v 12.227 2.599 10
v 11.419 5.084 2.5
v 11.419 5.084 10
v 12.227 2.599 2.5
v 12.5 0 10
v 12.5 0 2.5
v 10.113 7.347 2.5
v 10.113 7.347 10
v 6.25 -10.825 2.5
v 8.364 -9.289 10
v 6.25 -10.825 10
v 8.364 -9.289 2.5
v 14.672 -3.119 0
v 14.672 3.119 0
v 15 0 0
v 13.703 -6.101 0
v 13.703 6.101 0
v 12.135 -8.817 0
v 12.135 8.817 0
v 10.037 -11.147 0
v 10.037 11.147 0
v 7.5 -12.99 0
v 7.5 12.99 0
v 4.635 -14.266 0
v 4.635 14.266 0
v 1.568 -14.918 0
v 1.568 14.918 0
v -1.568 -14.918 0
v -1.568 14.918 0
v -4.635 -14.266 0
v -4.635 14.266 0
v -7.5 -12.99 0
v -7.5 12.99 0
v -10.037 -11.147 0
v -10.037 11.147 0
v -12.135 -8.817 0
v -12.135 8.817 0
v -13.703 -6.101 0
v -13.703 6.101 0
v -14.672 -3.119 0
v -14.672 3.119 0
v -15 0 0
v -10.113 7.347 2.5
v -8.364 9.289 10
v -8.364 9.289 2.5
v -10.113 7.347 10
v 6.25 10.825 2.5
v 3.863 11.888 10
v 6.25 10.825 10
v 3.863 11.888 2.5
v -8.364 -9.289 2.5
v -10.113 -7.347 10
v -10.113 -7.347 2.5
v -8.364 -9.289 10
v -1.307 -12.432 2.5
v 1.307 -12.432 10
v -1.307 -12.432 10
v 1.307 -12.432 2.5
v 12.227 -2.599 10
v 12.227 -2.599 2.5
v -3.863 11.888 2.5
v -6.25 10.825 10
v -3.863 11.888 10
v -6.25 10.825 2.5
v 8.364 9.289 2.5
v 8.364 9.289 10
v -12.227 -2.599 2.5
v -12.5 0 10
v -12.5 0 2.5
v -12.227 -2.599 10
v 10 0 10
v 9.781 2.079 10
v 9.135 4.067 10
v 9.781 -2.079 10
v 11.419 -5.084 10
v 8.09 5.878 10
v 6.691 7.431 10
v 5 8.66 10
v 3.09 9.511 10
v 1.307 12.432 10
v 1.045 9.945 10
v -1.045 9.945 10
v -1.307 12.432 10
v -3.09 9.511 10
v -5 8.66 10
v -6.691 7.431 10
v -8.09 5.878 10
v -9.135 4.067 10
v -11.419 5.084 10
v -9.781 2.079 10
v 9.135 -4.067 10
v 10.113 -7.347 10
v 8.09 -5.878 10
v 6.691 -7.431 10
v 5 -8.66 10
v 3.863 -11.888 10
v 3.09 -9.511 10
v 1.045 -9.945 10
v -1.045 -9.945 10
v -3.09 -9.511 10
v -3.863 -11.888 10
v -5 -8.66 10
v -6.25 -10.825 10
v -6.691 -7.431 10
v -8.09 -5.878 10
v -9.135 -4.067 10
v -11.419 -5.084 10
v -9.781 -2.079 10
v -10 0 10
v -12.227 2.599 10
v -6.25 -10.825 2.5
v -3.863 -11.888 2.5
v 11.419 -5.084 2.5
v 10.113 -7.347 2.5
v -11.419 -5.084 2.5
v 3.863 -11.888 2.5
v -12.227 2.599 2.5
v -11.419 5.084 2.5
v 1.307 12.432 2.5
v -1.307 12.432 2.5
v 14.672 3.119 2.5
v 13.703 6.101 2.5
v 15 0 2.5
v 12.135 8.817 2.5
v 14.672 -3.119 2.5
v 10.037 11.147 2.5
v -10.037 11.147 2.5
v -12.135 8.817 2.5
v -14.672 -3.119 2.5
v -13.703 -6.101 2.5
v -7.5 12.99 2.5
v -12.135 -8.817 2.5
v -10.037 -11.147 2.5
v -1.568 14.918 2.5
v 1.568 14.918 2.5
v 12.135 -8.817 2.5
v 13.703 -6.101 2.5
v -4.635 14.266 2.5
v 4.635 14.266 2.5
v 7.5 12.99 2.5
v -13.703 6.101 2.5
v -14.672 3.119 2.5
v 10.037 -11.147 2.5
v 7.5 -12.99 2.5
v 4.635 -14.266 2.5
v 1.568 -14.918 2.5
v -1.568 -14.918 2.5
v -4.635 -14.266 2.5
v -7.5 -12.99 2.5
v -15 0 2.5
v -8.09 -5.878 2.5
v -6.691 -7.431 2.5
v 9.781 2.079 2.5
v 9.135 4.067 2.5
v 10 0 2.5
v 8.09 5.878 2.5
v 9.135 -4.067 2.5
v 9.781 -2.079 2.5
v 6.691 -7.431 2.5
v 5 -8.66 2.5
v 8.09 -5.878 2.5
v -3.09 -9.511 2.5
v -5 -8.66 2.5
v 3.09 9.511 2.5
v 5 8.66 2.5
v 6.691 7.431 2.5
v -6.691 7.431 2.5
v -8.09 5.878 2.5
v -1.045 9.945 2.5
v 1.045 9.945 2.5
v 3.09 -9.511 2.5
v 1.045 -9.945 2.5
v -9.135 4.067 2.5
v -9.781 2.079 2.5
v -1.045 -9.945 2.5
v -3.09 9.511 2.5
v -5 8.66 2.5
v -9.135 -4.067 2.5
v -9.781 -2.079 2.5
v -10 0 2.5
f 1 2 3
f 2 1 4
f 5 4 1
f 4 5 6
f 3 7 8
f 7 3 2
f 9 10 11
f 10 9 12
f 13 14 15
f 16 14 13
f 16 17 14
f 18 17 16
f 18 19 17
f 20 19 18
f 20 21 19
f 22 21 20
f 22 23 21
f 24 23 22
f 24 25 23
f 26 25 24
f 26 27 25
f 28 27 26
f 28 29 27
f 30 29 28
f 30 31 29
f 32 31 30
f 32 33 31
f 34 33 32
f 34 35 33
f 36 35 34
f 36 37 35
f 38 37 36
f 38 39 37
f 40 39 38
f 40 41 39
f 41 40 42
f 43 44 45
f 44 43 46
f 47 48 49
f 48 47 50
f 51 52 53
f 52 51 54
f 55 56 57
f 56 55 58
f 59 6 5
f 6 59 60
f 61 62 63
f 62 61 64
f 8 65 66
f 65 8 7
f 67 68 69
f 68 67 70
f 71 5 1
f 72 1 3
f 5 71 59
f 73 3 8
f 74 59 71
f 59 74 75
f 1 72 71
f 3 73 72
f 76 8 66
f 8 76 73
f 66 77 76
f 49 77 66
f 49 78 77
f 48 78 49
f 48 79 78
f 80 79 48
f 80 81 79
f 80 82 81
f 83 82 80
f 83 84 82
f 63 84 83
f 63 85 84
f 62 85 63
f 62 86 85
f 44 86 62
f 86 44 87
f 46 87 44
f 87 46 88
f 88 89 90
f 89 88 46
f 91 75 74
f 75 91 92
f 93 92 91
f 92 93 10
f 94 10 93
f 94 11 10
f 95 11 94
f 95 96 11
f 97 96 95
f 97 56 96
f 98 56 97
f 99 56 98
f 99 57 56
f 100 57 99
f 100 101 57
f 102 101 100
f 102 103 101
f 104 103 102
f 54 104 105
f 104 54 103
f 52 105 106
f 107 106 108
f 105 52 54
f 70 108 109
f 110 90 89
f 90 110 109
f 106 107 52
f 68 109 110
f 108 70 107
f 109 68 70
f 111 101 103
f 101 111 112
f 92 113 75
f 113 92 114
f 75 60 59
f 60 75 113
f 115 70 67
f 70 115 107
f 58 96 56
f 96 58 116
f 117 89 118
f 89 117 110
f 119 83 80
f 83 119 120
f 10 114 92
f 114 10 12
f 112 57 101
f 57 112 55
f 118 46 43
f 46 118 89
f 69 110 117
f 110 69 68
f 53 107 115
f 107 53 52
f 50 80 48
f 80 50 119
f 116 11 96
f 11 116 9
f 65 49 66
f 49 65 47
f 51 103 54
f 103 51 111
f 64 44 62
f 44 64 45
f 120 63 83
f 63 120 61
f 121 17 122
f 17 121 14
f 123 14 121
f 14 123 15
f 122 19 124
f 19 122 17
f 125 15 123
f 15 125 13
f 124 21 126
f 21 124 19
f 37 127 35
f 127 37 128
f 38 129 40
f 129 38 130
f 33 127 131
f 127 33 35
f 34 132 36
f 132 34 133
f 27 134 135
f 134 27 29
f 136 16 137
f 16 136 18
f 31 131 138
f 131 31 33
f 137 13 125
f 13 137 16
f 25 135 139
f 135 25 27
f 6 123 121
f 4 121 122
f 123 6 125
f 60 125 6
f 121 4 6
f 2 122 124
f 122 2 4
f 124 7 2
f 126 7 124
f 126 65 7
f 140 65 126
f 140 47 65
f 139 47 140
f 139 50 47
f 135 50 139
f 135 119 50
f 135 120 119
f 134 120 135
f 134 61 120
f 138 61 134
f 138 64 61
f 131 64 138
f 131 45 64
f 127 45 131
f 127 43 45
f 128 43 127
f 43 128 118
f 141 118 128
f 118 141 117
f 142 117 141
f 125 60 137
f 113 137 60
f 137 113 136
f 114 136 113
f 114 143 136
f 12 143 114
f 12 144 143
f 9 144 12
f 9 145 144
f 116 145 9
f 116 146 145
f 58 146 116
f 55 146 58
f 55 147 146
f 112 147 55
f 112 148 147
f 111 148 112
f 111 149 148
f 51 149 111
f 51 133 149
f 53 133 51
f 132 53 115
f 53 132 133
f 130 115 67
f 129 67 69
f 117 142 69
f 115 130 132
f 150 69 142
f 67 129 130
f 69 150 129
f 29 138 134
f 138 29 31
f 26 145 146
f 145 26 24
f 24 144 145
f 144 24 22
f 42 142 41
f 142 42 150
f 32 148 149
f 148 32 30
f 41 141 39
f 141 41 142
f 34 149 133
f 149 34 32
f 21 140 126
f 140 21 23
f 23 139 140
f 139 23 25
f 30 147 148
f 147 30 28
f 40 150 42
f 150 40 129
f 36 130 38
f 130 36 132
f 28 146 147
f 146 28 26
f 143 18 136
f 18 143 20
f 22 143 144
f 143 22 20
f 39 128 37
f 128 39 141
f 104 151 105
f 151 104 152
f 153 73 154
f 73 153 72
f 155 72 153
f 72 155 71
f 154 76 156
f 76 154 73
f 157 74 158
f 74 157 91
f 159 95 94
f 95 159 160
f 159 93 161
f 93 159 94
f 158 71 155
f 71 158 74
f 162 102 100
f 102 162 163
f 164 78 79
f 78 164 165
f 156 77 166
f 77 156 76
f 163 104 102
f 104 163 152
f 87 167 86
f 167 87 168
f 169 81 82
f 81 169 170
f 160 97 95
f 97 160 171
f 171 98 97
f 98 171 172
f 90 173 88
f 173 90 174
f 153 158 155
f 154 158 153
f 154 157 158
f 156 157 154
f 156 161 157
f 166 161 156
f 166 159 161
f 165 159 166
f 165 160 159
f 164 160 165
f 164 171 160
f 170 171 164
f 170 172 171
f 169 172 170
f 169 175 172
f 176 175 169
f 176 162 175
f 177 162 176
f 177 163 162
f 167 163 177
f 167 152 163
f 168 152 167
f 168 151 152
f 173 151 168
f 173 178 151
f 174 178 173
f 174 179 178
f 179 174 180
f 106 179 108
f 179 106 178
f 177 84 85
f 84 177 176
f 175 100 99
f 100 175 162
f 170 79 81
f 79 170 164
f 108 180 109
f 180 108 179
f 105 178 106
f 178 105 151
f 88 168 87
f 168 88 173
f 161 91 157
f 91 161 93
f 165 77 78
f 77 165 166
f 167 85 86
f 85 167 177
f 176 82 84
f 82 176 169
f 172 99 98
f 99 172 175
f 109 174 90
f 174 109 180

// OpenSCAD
// Customizable circular device foot
// Created by Kjell Kernen
// Date 14.1.2017

/*[Foot Parameters]*/

// of the foot in tens of mm:
diameter=250;      // [50:500]

// of the foot in tens of mm:
total_height=100;       // [25:1000]

// of the foot in tens of mm:
flange_height=25;// [0:50]

// of the foot in tens of mm:
flange_width=25;// [0:50]

/*[Hidden]*/


difference()
{
        union()
        {
            cylinder(r=(diameter/20), h=total_height/10);	
            cylinder(r=((diameter + (flange_width*2))/20), h=flange_height/10);	
        }
        translate([0,0,flange_height/10])
            cylinder(r=((diameter-50)/20), h=(total_height/10) + 2);	
}
